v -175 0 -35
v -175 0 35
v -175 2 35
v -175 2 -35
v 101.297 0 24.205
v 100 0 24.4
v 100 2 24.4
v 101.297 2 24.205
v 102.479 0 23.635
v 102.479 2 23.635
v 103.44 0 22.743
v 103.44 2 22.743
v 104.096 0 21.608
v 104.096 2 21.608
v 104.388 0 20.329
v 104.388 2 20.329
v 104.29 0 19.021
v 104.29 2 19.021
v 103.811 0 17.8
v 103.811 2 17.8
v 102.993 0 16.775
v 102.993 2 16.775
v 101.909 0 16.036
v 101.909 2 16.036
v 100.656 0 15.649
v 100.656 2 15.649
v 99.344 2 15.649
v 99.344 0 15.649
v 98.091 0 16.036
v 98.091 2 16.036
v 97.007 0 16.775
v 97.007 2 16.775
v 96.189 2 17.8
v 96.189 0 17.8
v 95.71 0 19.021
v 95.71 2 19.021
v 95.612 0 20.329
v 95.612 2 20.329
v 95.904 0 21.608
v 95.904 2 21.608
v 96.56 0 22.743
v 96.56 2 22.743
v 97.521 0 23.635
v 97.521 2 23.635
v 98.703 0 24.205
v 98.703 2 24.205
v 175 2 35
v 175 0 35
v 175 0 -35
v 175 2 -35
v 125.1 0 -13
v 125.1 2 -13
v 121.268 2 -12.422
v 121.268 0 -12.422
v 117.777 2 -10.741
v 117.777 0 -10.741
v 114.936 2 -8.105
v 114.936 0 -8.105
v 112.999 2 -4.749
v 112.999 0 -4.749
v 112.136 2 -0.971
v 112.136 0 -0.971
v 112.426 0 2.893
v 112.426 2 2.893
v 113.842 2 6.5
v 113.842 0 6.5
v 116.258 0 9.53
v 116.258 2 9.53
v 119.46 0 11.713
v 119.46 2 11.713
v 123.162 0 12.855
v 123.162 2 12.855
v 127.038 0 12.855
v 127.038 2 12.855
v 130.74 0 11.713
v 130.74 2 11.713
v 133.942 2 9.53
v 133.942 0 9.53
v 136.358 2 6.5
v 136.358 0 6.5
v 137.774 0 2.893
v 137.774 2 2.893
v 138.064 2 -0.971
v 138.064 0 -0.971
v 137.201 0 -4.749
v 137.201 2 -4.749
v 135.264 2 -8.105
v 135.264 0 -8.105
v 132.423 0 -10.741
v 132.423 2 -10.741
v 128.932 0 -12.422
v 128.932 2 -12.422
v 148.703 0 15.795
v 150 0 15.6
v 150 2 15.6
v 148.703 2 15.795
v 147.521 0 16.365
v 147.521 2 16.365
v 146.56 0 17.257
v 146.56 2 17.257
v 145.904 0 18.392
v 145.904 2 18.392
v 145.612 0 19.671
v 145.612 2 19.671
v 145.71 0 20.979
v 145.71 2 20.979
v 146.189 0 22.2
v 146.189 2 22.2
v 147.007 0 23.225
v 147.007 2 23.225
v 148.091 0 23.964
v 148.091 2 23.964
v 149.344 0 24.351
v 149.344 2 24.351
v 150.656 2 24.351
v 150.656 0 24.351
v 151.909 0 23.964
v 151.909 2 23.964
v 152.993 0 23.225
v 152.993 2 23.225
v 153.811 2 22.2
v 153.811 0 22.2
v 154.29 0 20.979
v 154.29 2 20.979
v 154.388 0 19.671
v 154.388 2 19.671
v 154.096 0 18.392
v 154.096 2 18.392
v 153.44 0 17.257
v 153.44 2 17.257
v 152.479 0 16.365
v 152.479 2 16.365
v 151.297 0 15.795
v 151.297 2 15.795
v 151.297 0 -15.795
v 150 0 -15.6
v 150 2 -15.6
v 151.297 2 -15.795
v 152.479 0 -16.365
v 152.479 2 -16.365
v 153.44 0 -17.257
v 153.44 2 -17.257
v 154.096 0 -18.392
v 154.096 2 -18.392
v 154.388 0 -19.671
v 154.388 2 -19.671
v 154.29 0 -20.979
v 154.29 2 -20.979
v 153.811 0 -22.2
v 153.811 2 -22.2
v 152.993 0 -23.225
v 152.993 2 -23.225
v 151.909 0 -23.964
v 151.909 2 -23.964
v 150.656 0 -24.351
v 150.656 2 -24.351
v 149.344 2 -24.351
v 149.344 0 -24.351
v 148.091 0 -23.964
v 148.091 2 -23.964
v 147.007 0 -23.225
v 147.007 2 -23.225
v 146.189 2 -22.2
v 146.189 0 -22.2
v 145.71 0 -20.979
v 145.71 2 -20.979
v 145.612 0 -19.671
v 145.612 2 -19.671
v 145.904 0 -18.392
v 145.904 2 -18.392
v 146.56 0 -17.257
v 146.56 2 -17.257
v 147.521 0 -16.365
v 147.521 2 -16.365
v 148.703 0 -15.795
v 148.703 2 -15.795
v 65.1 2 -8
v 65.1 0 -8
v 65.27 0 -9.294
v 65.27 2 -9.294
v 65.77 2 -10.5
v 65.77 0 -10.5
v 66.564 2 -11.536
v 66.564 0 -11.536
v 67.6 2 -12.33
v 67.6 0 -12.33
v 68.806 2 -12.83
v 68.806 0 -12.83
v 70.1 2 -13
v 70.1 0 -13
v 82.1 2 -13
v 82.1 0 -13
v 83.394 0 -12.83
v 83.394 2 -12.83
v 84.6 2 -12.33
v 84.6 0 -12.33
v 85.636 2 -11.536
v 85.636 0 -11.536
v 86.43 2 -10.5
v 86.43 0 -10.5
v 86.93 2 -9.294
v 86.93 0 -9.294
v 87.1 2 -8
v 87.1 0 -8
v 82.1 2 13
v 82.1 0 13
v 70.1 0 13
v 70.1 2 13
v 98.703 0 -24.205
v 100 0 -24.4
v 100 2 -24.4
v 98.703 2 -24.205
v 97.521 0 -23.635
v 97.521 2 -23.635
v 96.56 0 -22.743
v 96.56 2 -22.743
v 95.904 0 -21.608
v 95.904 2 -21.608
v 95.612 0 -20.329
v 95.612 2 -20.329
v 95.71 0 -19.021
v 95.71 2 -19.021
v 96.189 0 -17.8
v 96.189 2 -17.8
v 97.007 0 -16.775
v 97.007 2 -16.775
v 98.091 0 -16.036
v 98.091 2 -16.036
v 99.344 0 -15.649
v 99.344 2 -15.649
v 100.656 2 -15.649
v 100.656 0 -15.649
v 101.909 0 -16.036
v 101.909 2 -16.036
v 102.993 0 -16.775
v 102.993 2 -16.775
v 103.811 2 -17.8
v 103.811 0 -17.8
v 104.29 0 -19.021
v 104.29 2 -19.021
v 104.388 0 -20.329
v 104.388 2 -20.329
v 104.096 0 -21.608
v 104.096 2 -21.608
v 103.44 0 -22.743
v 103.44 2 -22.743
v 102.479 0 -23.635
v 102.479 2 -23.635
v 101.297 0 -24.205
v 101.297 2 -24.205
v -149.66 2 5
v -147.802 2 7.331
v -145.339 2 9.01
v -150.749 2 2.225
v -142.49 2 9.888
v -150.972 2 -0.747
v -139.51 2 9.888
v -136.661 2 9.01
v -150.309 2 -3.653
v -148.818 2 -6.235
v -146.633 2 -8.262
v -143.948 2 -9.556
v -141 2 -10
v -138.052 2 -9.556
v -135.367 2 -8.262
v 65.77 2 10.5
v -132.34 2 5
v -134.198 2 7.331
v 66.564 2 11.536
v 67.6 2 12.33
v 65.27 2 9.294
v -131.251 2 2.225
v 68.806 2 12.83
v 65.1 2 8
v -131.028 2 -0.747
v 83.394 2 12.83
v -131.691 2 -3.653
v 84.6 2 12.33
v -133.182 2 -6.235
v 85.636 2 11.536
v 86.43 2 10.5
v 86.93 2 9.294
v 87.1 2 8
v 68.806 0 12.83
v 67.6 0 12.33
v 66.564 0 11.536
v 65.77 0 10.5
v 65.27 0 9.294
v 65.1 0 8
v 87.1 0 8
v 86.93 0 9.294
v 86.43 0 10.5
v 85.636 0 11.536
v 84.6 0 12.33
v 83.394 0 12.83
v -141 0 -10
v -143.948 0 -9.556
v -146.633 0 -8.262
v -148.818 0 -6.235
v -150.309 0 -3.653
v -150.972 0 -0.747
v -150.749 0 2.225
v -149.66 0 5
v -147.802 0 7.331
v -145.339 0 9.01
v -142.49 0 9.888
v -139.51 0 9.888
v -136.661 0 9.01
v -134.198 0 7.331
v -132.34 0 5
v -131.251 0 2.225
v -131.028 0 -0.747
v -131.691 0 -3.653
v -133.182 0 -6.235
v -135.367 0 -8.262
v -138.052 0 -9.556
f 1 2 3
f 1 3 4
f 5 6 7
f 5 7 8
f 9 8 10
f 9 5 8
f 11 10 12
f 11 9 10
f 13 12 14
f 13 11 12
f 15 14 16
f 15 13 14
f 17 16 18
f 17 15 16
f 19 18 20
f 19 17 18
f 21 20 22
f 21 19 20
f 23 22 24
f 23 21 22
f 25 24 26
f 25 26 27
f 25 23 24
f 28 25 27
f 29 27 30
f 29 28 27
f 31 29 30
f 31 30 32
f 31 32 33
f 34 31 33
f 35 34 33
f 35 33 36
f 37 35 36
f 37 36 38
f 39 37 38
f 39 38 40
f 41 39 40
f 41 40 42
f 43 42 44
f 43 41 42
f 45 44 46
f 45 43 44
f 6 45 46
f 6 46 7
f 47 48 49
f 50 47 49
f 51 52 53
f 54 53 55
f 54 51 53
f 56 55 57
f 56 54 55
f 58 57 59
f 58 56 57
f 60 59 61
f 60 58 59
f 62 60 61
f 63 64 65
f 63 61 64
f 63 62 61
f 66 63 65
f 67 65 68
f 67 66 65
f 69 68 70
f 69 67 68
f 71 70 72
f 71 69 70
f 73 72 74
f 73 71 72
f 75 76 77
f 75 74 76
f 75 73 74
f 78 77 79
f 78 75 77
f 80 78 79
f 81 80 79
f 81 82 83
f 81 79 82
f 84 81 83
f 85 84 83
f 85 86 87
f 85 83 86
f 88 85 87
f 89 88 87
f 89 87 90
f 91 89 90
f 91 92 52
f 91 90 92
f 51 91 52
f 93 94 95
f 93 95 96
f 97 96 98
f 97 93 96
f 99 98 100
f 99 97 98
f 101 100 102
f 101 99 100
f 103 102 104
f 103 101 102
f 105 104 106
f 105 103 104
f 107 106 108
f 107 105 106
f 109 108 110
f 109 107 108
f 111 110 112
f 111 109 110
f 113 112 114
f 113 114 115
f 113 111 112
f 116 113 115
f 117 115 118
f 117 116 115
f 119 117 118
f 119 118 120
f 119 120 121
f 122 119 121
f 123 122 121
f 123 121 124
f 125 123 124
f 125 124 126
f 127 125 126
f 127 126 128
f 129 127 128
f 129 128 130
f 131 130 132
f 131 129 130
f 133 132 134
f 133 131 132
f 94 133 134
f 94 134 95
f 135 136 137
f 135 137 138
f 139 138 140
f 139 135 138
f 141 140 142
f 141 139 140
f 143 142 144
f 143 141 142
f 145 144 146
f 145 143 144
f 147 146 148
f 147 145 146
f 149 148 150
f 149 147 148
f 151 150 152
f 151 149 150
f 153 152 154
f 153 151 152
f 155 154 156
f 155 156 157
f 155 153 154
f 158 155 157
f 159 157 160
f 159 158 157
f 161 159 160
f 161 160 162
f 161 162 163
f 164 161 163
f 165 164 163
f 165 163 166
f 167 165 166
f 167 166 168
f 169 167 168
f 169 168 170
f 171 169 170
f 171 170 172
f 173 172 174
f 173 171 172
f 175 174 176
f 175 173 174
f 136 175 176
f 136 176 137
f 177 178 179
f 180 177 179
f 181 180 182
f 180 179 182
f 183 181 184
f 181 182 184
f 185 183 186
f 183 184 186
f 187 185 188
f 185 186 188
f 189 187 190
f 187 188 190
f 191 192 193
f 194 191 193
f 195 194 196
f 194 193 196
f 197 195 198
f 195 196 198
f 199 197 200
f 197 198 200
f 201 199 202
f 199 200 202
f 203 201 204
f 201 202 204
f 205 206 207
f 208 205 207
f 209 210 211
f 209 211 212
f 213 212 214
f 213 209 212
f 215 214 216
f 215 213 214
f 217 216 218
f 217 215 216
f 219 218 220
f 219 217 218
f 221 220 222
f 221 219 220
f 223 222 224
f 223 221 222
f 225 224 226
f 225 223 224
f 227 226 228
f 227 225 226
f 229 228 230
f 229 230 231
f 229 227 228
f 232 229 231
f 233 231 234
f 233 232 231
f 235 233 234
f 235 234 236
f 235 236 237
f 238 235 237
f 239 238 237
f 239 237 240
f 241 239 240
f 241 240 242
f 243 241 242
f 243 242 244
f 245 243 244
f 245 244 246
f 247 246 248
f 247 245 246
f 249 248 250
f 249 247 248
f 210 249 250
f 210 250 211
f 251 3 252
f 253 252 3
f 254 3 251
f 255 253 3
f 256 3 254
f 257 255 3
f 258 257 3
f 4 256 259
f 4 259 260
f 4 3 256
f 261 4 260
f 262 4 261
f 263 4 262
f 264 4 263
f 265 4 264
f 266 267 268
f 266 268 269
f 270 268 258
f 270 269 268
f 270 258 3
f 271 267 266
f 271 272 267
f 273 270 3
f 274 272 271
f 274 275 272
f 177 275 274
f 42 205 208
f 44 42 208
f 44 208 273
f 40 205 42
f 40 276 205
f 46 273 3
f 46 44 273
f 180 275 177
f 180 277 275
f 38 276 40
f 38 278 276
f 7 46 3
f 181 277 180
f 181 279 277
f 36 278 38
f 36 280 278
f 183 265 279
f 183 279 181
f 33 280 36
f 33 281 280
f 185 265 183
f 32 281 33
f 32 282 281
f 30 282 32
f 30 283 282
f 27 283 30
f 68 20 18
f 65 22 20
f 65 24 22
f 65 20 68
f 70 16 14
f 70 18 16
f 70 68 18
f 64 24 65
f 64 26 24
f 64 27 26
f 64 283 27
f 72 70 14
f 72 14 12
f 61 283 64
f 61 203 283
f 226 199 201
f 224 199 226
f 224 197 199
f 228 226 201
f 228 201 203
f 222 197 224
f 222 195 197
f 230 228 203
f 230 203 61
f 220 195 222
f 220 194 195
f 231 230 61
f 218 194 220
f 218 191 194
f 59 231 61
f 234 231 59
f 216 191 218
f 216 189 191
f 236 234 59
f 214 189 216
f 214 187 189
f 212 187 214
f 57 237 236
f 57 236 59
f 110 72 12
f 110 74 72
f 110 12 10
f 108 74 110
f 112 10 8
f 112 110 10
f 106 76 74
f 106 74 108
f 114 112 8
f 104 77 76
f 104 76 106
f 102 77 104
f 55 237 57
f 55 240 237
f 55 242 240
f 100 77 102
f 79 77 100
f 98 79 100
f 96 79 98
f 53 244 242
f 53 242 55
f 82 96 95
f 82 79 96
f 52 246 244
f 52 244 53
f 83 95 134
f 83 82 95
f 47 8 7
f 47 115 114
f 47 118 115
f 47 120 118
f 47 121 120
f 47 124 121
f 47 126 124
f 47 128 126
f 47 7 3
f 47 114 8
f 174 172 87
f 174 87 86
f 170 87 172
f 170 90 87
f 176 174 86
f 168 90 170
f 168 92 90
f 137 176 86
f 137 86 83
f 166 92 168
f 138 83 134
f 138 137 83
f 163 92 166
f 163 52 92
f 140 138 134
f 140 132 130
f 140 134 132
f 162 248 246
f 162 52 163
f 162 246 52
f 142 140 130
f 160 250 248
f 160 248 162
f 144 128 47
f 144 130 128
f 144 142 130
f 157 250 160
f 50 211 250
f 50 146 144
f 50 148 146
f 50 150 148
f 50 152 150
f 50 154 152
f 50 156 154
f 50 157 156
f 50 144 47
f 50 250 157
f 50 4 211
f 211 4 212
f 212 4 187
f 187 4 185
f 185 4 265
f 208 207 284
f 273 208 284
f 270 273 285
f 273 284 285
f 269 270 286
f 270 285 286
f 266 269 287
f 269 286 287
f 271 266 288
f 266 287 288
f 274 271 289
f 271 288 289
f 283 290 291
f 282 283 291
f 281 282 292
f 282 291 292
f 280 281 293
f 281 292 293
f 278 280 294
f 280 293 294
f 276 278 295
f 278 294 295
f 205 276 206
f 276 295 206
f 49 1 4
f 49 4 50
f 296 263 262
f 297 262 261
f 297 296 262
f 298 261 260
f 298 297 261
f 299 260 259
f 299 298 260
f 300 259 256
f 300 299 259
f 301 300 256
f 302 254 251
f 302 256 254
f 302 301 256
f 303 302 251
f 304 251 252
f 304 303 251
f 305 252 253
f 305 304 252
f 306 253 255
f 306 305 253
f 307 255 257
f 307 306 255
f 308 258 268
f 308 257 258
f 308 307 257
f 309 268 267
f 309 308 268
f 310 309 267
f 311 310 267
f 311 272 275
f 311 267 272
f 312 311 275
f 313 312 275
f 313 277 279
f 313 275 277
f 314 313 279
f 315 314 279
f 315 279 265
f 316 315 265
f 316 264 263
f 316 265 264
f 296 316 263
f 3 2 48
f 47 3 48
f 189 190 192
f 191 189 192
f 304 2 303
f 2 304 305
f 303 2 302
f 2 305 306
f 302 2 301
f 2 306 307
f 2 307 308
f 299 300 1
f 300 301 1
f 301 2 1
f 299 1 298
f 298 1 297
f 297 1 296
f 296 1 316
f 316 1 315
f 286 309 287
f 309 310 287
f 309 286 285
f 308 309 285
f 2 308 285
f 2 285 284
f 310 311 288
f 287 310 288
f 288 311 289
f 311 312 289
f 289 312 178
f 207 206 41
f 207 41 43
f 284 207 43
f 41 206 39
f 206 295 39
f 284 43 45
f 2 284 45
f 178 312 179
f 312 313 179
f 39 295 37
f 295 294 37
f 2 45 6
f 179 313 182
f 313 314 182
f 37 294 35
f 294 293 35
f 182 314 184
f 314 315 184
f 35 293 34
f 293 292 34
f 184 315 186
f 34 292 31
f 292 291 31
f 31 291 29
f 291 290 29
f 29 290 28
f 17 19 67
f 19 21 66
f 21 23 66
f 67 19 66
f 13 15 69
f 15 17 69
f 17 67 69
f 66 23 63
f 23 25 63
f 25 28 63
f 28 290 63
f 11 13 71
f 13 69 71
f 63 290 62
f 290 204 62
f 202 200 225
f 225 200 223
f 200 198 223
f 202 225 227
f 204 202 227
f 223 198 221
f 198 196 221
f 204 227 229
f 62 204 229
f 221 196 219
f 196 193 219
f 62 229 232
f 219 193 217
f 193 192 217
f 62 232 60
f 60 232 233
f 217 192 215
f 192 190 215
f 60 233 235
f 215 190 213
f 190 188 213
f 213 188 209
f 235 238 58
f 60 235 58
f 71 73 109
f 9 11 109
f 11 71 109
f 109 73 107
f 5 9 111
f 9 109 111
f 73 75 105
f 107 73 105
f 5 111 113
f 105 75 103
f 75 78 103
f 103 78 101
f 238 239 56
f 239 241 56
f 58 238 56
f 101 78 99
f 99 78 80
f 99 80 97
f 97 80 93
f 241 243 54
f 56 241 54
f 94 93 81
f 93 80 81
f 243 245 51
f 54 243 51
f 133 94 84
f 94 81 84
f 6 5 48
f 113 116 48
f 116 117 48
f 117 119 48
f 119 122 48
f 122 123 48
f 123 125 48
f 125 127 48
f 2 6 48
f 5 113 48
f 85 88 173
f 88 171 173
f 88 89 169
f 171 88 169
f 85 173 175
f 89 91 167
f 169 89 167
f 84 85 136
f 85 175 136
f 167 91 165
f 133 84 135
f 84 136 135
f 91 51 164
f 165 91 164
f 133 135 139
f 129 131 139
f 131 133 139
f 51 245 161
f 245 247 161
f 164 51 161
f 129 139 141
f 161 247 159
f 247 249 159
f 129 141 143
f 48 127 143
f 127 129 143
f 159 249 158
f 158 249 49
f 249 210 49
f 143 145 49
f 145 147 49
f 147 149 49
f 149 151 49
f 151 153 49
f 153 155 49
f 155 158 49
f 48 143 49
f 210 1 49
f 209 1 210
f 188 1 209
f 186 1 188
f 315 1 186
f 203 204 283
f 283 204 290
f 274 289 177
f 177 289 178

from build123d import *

# Parameters (mm, degrees)
SKETCH1_W           = 350
SKETCH1_H           = 70
SKETCH1_R           = 4.4
BOSS_EXTRUDE1_DEPTH = 2
CUT_EXTRUDE1_REACH  = 180.477
SKETCH2_R           = 13
CUT_EXTRUDE2_REACH  = 180.477
SKETCH3_R           = 10


with BuildPart() as part:
    # Sketch1 → Boss-Extrude1 (new body)
    with BuildSketch(Plane(origin=(0, 0, 0), x_dir=(1, 0, 0), z_dir=(0, 1, 0))):
        Rectangle(SKETCH1_W, SKETCH1_H)
        with Locations(Location((150, 20, 0), (0, 0, 270))):
            Circle(SKETCH1_R, mode=Mode.SUBTRACT)
        with Locations(Location((150, -20, 0), (0, 0, 90))):
            Circle(SKETCH1_R, mode=Mode.SUBTRACT)
        with Locations(Location((100, -20, 0), (0, 0, 270))):
            Circle(SKETCH1_R, mode=Mode.SUBTRACT)
        with Locations(Location((100, 20, 0), (0, 0, 90))):
            Circle(SKETCH1_R, mode=Mode.SUBTRACT)
        with BuildLine():
            Line((82.1, -13), (70.1, -13))
            ThreePointArc((70.1, -13), (66.564466094, -11.535533906), (65.1, -8))
            Line((65.1, -8), (65.1, 8))
            ThreePointArc((65.1, 8), (66.564466094, 11.535533906), (70.1, 13))
            Line((70.1, 13), (82.1, 13))
            ThreePointArc((82.1, 13), (85.635533906, 11.535533906), (87.1, 8))
            Line((87.1, 8), (87.1, -8))
            ThreePointArc((87.1, -8), (85.635533906, -11.535533906), (82.1, -13))
        make_face(mode=Mode.SUBTRACT)
    extrude(amount=BOSS_EXTRUDE1_DEPTH)

    # Sketch2 → Cut-Extrude1 (cut, up to next)
    with BuildSketch(Plane(origin=(0, 0, 0), x_dir=(1, 0, 0), z_dir=(0, 1, 0)), mode=Mode.PRIVATE) as cut_extrude1_sk1:
        with Locations(Location((125.1, 0, 0), (0, 0, 90))):
            Circle(SKETCH2_R)
    cut_extrude1_tool1 = extrude(cut_extrude1_sk1.sketch, amount=CUT_EXTRUDE1_REACH, mode=Mode.PRIVATE) & part.part
    add(cut_extrude1_tool1.solids().sort_by_distance((125.1, 0, 0))[0], mode=Mode.SUBTRACT)

    # Sketch3 → Cut-Extrude2 (cut, up to next)
    with BuildSketch(Plane(origin=(0, 0, 0), x_dir=(1, 0, 0), z_dir=(0, 1, 0)), mode=Mode.PRIVATE) as cut_extrude2_sk1:
        with Locations(Location((-141, 0, 0), (0, 0, 90))):
            Circle(SKETCH3_R)
    cut_extrude2_tool1 = extrude(cut_extrude2_sk1.sketch, amount=CUT_EXTRUDE2_REACH, mode=Mode.PRIVATE) & part.part
    add(cut_extrude2_tool1.solids().sort_by_distance((-141, 0, 0))[0], mode=Mode.SUBTRACT)


solid = part.part
